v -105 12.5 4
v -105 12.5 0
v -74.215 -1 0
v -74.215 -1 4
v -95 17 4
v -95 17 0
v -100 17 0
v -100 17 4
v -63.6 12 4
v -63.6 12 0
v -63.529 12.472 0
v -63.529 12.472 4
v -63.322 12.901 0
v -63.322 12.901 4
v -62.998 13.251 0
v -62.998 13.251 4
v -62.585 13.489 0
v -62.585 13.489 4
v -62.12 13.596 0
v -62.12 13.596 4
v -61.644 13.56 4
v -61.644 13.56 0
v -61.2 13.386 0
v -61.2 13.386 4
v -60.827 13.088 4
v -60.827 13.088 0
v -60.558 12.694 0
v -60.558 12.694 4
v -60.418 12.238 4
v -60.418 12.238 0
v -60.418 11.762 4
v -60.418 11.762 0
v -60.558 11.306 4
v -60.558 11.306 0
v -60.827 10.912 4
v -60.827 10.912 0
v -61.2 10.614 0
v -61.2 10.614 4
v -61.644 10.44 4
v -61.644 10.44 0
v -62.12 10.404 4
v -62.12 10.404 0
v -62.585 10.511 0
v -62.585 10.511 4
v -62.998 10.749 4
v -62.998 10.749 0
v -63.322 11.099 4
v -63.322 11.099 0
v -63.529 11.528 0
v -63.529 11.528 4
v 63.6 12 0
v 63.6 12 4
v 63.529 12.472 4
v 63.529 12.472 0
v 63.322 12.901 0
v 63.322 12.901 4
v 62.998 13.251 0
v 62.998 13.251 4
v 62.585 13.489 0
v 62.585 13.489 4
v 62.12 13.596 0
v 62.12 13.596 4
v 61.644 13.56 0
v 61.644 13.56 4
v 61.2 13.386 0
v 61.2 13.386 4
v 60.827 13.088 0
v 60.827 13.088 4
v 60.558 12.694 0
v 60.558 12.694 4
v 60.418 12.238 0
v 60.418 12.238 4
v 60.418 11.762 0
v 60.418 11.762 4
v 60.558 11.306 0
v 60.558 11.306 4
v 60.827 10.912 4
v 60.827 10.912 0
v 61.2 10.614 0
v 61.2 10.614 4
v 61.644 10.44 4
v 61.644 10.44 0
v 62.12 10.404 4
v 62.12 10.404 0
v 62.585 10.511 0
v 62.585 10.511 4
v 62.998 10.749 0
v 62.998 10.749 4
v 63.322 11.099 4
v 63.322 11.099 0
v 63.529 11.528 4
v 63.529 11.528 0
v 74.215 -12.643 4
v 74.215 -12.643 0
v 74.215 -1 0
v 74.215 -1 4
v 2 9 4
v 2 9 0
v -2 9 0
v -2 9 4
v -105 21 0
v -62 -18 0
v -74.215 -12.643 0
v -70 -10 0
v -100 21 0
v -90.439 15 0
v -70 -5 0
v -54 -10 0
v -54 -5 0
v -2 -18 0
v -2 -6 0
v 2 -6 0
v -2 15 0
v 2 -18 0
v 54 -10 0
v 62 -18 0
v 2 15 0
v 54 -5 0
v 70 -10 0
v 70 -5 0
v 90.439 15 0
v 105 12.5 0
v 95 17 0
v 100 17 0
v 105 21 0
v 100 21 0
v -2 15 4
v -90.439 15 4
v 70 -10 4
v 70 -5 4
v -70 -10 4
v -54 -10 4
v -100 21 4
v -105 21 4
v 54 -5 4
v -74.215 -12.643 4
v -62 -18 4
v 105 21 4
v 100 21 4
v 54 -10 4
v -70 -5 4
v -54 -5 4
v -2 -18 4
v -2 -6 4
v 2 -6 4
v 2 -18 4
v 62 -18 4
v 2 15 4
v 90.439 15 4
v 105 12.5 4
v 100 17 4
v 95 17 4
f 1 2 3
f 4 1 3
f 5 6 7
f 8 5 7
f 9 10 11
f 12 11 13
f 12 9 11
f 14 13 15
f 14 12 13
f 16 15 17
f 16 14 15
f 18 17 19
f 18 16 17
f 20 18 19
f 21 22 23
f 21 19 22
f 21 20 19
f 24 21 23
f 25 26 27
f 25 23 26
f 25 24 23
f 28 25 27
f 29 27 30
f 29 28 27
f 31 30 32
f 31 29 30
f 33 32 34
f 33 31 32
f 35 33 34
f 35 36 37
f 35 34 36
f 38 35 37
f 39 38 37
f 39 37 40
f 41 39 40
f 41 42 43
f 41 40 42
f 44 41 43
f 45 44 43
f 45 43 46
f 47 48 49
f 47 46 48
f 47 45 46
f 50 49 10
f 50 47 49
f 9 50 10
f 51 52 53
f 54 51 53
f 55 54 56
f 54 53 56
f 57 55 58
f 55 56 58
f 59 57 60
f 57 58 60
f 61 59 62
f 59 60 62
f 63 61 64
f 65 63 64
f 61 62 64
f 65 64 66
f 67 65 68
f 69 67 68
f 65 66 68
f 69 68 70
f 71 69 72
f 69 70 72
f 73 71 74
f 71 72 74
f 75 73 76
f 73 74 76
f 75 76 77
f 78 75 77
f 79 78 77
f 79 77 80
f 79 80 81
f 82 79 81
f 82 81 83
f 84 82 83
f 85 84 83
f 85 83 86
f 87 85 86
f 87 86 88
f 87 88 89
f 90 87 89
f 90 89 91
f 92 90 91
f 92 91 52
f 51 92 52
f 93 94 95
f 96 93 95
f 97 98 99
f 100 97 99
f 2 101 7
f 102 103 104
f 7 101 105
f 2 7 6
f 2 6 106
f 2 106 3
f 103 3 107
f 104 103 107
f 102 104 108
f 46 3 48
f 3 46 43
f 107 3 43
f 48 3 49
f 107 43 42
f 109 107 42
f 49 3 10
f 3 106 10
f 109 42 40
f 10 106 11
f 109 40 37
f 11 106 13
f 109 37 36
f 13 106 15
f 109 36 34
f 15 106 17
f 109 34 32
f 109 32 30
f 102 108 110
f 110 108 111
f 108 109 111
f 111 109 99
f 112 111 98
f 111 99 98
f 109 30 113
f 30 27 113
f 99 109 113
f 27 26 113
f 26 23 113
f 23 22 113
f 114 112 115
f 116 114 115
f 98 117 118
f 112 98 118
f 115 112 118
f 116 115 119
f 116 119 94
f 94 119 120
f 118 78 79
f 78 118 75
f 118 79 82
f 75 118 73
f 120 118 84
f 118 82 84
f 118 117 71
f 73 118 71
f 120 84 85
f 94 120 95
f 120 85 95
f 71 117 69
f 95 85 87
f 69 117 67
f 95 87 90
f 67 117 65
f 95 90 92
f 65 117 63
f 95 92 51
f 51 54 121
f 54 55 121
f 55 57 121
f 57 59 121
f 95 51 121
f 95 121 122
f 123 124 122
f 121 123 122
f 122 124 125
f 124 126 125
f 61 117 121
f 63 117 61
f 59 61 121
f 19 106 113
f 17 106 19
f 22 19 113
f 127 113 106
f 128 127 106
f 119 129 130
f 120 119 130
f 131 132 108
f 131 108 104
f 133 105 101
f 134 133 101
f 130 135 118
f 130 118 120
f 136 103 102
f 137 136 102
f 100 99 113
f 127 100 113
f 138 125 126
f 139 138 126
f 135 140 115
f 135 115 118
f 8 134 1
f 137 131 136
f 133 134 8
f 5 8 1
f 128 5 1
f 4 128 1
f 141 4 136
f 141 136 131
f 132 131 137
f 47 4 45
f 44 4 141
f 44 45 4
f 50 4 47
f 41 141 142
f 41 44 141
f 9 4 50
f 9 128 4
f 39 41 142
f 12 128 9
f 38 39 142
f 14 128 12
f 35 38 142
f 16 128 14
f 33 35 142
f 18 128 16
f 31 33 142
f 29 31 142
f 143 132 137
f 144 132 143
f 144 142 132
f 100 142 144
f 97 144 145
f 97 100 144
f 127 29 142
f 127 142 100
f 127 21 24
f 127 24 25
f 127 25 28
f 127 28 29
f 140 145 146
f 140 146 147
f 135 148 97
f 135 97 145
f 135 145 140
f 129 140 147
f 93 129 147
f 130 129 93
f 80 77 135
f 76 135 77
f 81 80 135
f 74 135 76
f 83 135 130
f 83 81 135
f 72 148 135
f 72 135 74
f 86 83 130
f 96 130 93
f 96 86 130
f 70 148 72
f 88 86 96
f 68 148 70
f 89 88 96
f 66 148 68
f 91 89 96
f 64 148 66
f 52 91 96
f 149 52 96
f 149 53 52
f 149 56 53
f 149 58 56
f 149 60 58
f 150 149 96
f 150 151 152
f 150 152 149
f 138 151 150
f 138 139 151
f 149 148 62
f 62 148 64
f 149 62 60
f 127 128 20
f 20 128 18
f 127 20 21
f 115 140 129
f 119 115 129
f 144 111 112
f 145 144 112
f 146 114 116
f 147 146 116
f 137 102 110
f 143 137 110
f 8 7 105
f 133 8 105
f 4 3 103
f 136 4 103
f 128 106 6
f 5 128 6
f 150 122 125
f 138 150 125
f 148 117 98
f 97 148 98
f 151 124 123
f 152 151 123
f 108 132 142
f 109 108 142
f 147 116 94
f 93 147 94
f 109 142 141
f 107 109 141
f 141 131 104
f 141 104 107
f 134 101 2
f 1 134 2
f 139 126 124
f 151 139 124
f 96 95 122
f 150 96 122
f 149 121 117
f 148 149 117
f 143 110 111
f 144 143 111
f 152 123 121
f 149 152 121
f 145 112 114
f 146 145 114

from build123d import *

# Parameters (mm, degrees)
BOSS_EXTRUDE1_DEPTH = 4
SKETCH2_R           = 1.6
SKETCH2_W           = 16
SKETCH2_H           = 5
CUT_EXTRUDE1_DEPTH  = 108.154094649


with BuildPart() as part:
    # Sketch1 → Boss-Extrude1 (new body)
    with BuildSketch(Plane.XY):
        Polygon((-95, 17), (-100, 17), (-100, 21), (-105, 21), (-105, 12.500446192), (-74.214666133, -1), (-74.214666133, -12.643441465), (-62, -18), (-2, -18), (-2, -6), (2, -6), (2, -18), (62, -18), (74.214666133, -12.643441465), (74.214666133, -1), (105, 12.500446192), (105, 21), (100, 21), (100, 17), (95, 17), (90.439360532, 15), (2, 15), (2, 9), (-2, 9), (-2, 15), (-90.439360532, 15), align=None)
    extrude(amount=BOSS_EXTRUDE1_DEPTH)

    # Sketch2 → Cut-Extrude1 (cut, through all)
    with BuildSketch(Plane.XY.offset(4)):
        with Locations((62, 12)):
            Circle(SKETCH2_R)
        with Locations((62, -7.5)):
            Rectangle(SKETCH2_W, SKETCH2_H)
    cut_extrude1 = extrude(amount=-CUT_EXTRUDE1_DEPTH, mode=Mode.SUBTRACT)

    # Mirror1: Cut-Extrude1 across plane
    add(cut_extrude1.mirror(Plane(origin=(0, 0, 0), x_dir=(0, 0, 1), z_dir=(1, 0, 0))), mode=Mode.SUBTRACT)


solid = part.part
